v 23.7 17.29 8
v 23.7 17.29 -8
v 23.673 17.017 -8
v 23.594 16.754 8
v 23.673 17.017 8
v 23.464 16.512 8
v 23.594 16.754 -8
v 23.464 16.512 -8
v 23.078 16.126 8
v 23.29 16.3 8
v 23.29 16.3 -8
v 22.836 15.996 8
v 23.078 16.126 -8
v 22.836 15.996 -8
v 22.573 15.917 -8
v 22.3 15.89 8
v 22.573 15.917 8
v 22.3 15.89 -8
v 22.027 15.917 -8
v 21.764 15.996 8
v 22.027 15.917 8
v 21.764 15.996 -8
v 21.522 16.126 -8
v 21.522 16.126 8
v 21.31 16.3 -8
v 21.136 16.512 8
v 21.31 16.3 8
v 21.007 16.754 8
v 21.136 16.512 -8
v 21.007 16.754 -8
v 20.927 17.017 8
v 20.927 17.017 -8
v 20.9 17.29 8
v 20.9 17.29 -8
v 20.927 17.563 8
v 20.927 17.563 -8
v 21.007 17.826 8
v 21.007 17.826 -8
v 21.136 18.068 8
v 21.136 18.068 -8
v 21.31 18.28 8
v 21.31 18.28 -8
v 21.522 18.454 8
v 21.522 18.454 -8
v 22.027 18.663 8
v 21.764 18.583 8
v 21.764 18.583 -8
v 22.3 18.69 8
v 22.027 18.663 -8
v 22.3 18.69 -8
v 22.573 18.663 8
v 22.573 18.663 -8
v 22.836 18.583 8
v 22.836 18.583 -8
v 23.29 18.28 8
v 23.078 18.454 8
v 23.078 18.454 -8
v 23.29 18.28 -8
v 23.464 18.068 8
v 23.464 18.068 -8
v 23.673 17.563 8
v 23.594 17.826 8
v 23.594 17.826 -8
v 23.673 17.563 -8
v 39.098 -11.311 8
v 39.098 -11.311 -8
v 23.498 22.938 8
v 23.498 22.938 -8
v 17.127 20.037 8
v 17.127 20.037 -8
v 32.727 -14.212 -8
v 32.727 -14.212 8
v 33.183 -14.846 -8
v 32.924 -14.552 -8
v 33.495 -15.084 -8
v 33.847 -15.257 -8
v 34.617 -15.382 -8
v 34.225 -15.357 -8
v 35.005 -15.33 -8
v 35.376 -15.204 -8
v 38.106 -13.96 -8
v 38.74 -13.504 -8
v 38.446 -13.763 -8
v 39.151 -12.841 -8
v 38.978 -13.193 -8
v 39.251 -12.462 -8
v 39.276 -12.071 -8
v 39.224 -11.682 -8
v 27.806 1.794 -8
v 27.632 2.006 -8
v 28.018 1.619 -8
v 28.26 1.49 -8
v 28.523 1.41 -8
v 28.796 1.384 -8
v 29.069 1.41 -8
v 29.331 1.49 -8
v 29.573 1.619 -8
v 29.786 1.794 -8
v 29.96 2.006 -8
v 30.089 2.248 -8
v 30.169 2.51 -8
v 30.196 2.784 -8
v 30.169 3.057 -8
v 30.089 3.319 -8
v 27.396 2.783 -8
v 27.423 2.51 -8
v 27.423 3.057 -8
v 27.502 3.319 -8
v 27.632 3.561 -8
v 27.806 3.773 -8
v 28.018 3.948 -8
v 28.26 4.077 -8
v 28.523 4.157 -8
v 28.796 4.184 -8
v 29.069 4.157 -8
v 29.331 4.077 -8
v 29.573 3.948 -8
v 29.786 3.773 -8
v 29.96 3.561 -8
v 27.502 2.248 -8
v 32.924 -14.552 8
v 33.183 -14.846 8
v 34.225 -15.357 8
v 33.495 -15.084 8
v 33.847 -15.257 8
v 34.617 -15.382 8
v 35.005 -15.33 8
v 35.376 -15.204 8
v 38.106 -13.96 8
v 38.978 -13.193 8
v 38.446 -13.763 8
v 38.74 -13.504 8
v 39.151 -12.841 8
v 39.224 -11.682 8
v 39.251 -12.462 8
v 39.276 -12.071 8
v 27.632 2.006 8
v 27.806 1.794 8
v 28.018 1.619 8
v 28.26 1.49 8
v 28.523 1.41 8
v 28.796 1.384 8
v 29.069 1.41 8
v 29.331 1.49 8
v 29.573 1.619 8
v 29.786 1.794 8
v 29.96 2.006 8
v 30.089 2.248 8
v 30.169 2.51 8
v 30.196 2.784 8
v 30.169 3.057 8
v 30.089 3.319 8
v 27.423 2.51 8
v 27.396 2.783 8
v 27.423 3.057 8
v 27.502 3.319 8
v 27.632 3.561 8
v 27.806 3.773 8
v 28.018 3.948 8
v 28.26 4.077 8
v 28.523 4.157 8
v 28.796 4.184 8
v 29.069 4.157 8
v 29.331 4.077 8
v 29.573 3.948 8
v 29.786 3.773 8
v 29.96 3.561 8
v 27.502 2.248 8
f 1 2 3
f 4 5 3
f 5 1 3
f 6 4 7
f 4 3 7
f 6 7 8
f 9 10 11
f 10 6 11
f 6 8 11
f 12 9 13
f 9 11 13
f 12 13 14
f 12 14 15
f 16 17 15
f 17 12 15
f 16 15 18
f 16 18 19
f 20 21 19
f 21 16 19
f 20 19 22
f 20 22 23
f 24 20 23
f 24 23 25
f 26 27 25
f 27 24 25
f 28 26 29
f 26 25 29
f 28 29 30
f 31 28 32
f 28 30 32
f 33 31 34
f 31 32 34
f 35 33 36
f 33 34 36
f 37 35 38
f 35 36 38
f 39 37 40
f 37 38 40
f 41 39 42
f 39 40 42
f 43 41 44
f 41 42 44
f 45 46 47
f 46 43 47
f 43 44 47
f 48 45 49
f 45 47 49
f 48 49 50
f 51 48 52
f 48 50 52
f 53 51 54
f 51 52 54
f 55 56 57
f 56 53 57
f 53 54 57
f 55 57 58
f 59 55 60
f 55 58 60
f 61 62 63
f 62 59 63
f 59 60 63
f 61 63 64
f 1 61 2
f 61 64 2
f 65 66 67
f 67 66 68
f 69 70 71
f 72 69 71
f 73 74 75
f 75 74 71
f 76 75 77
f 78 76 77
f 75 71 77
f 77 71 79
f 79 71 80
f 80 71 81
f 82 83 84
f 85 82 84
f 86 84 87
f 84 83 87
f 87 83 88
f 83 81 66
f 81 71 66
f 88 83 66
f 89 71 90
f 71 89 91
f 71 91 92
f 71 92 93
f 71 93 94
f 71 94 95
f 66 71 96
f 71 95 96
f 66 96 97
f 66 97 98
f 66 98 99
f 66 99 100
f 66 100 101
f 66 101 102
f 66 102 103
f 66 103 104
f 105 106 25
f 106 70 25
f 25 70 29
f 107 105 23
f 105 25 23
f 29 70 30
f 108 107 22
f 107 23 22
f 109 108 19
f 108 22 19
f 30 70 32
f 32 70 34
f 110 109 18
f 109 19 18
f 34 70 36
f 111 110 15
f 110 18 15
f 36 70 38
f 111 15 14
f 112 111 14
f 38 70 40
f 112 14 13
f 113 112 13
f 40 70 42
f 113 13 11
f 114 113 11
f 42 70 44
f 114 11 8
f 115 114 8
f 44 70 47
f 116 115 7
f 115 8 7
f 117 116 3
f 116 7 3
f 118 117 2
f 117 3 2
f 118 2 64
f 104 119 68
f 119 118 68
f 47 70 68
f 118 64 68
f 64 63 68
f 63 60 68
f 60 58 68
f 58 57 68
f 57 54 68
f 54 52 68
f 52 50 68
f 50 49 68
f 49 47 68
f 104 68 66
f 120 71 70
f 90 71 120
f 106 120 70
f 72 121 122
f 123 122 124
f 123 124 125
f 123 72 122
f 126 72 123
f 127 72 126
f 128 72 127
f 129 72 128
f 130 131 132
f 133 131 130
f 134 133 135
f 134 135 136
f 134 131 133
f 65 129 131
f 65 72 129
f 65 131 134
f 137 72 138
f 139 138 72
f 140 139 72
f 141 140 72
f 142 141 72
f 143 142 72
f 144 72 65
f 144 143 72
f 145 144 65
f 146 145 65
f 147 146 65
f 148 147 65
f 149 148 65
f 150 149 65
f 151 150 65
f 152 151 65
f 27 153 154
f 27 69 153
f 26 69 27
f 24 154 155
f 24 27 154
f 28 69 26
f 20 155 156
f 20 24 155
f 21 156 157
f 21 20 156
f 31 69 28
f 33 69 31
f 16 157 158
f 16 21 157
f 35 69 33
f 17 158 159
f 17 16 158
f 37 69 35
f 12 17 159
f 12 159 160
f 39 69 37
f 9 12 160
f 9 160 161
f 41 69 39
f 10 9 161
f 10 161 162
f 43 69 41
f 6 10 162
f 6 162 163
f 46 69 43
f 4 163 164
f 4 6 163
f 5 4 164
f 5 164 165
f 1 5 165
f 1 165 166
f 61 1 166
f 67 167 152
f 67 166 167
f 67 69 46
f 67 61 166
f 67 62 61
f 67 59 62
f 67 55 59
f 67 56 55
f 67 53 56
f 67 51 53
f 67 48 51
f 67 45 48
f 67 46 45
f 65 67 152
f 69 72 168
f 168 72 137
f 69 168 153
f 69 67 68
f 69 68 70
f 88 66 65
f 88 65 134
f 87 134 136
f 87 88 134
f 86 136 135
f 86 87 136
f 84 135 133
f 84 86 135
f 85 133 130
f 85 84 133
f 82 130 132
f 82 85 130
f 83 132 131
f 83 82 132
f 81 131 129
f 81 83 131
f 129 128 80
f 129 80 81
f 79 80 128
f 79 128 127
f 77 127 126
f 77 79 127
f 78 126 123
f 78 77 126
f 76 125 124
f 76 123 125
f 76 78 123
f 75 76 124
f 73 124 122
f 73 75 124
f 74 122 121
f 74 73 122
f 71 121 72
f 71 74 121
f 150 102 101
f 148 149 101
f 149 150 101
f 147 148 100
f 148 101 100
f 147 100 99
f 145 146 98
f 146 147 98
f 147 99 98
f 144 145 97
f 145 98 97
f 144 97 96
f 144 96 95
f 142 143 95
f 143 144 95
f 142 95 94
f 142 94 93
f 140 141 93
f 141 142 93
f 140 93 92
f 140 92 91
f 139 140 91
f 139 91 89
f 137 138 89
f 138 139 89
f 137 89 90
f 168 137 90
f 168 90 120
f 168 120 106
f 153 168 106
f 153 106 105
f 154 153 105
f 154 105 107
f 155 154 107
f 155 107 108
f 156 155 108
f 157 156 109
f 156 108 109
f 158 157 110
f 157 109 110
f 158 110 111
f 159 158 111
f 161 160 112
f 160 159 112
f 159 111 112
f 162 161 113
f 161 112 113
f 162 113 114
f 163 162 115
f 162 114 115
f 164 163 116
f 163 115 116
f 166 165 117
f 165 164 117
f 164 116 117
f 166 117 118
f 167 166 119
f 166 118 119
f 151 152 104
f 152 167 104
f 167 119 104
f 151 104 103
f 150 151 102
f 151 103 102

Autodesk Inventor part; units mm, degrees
ref_plane "YZ Plane" through (0, 0, 0) normal (1, 0, 0) x (0, 1, 0)
ref_plane "XZ Plane" through (0, 0, 0) normal (0, 1, 0) x (-1, 0, 0)
ref_plane "XY Plane" through (0, 0, 0) normal (0, 0, 1) x (1, 0, 0)
ref_plane "Arbeitsebene1" through (0, 0, 0) normal (0, 0, 1) x (1, 0, 0)
sketch "Skizze1" plane through (0, 0, 0) normal (0, 0, 1) x (1, 0, 0)
  line L0 (6, 5) -> (6, 20.6772) projected
  line L1 (25.0752, 5) -> (6, 5) projected
  line L2 (20.3151, 15.4507) -> (25.0752, 5)
  line L3 (6, 20.6772) -> (20.3151, 15.4507) projected
  circle A0 centre (28.7957, 2.7835) radius 1.4 projected
  circle A1 centre (22.3001, 17.2899) radius 1.4
  line L4 (32.7967, 0.1099) -> (23.0022, 21.6136)
  arc A2 (30.9766, -2.7191) -> (32.7967, 0.1099) centre (30.9766, -0.7191) ccw projected
  line L5 (29.8778, -2.7191) -> (30.9766, -2.7191) projected
  arc A3 (28.0577, -1.5481) -> (29.8778, -2.7191) centre (29.8778, -0.7191) ccw projected
  line L6 (27.3526, 0) -> (28.0577, -1.5481) projected
  line L7 (0, 0) -> (27.3526, 0) projected
  line L8 (0, 0) -> (0, 26) projected
  line L9 (0, 26) -> (6, 26) projected
  line L10 (23.0022, 21.6136) -> (18.452, 19.5411)
  line L11 (18.452, 19.5411) -> (34.0518, -14.708)
  line L12 (34.0518, -14.708) -> (38.602, -12.6355)
  line L13 (38.602, -12.6355) -> (23.0022, 21.6136)
  line L14 (23.4977, 22.9382) -> (17.1274, 20.0366)
  line L15 (17.1274, 20.0366) -> (32.7273, -14.2125)
  line L16 (35.3764, -15.2036) -> (38.1065, -13.96)
  line L17 (39.0976, -11.3109) -> (23.4977, 22.9382)
  arc A4 (38.1065, -13.96) -> (39.0976, -11.3109) centre (37.2775, -12.1399) ccw
  arc A5 (32.7273, -14.2125) -> (35.3764, -15.2036) centre (34.5474, -13.3835) ccw
  point P0 (22.6951, 10.2253)
  point P1 (28.0577, -1.5481)
  point P2 (26.2537, 0)
  point P3 (18.9971, 15.9319)
  dimension "d2" = 1
  dimension "d3" = 2
extrude "Extrusion1" add sketch "Skizze1" along normal mid plane 16 contours L15 L3 L2 L1 | L1 L11 L7 L15 | L15 L14 L17 A4 L16 A5 L7 L6 L11 L12 L13 L4 L10 L3 | L2 L11 L10 L4 A2 L5 A3 L6 | A3 L5 A2 L13 L12 L11
properties part number "Gripper_linear_finger_long"
